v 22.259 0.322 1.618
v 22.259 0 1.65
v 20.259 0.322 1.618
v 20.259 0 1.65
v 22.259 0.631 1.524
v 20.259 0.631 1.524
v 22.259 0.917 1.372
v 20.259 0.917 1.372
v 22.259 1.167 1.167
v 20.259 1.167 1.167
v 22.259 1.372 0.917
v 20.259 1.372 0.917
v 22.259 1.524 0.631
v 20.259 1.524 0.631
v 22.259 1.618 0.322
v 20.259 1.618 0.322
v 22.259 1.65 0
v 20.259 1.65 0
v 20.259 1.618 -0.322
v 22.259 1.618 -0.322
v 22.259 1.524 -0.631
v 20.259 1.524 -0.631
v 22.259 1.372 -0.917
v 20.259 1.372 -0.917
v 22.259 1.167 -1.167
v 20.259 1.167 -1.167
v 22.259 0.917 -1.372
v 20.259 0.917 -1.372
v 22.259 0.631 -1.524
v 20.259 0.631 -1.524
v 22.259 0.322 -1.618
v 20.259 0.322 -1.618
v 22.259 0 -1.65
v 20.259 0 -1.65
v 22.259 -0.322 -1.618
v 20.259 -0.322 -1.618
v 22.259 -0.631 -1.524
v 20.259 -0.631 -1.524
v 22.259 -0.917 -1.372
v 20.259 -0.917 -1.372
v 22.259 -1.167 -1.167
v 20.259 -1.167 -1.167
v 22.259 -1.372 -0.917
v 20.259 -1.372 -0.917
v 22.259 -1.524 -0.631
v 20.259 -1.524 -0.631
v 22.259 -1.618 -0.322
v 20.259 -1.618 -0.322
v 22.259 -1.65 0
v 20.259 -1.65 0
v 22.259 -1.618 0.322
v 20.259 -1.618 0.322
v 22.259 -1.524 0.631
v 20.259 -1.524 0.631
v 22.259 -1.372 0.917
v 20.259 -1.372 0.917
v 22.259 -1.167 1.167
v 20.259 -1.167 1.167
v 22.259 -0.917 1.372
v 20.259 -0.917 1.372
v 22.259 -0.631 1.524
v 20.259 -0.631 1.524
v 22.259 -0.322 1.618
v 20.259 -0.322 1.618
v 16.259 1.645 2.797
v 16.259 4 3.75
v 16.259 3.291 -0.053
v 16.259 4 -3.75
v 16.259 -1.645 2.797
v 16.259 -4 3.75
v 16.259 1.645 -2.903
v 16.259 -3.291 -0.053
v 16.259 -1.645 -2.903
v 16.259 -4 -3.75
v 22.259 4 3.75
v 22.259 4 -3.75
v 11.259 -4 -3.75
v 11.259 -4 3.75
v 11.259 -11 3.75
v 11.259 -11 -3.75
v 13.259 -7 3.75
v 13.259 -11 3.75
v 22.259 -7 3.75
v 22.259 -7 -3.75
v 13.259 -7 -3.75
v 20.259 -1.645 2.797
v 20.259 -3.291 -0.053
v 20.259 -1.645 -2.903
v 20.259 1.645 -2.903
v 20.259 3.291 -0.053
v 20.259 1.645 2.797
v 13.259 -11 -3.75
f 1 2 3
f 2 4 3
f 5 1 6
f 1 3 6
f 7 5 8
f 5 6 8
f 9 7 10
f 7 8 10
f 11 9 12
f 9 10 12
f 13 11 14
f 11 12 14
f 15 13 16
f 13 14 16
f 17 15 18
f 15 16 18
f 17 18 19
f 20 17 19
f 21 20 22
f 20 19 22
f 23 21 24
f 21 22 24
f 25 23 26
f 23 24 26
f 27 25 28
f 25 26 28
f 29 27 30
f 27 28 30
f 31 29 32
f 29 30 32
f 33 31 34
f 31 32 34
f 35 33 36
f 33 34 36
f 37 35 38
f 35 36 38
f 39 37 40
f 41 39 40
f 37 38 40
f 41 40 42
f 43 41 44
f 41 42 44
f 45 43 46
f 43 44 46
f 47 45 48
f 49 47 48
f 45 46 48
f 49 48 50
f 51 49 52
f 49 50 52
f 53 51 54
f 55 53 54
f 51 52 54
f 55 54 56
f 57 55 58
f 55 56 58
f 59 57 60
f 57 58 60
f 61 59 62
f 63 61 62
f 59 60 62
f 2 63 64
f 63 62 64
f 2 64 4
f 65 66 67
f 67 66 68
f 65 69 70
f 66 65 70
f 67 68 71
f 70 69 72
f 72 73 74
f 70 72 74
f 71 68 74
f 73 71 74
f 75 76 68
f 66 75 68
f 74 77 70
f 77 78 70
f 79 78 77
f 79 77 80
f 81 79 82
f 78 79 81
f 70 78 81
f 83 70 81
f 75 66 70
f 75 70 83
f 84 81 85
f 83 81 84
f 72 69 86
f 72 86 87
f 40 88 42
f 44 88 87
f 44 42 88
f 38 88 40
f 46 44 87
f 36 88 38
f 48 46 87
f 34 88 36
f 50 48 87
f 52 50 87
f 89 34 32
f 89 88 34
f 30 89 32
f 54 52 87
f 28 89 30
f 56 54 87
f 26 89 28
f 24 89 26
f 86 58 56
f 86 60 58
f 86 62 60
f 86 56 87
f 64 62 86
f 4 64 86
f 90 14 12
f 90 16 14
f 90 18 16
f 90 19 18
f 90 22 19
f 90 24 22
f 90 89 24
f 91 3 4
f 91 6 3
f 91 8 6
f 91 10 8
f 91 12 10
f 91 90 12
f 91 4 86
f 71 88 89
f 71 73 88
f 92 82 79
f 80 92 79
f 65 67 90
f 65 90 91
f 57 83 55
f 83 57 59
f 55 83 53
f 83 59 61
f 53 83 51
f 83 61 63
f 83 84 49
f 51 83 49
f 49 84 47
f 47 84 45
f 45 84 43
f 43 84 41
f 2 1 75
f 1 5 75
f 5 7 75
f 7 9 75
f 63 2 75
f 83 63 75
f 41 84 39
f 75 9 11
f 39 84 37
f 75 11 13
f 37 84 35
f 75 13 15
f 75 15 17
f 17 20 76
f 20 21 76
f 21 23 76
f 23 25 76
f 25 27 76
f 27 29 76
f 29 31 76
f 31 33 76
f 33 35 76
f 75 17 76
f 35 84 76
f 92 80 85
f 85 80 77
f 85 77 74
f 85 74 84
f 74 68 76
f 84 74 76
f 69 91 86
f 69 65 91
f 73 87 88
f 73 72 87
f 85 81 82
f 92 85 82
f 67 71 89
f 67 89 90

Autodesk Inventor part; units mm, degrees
ref_plane "YZ Plane" through (0, 0, 0) normal (1, 0, 0) x (0, 1, 0)
ref_plane "XZ Plane" through (0, 0, 0) normal (0, 1, 0) x (-1, 0, 0)
ref_plane "XY Plane" through (0, 0, 0) normal (0, 0, 1) x (1, 0, 0)
sketch "Sketch1" plane through (0, 0, 0) normal (0, 0, 1) x (1, 0, 0)
  line L0 (31.7273, 1.5) -> (12.134, 1.5)
  line L1 (31.7273, -1.5) -> (12.134, -1.5)
  line L2 (16.2594, -4) -> (22.2594, -4)
  line L3 (22.2594, -4) -> (22.2594, 4)
  line L4 (22.2594, 4) -> (16.2594, 4)
  line L5 (16.2594, 4) -> (16.2594, -4)
  line L6 (16.2594, -4) -> (22.2594, 4) construction
  line L7 (22.2594, -4) -> (16.2594, 4) construction
  point P0 (0, 0)
  point P1 (19.2594, 0)
  dimension "d0" = 8
  dimension "d1" = 6
extrude "Extrusion1" add sketch "Sketch1" along normal mid plane 7.5
sketch "Sketch2" plane through (16.2594, -4, 3.75) normal (-1, 0, 0) x (0, 0, 1)
  line L0 (0, 0) -> (-7.5, 0) projected
  line L1 (0, 8) -> (0, 0) projected
  line L2 (-7.5, 8) -> (0, 8) projected
  line L3 (-7.5, 0) -> (-7.5, 8) projected
  circle A0 centre (-3.75, 4) radius 1.65
  dimension "d17" = 3.3
extrude "Extrusion2" cut sketch "Sketch2" against normal through all contours A0
sketch "Sketch3" plane through (16.2594, -4, 3.75) normal (-1, 0, 0) x (0, 0, 1)
  point P0 (-3.75, 4)
sketch "Sketch4" plane through (16.2594, -4, 3.75) normal (-1, 0, 0) x (0, 0, 1)
  line L0 (-0.953, 2.3546) -> (-3.803, 0.7091)
  line L1 (-3.803, 0.7091) -> (-6.653, 2.3546)
  line L2 (-6.653, 2.3546) -> (-6.653, 5.6454)
  line L3 (-6.653, 5.6454) -> (-3.803, 7.2909)
  line L4 (-3.803, 7.2909) -> (-0.953, 5.6454)
  line L5 (-0.953, 5.6454) -> (-0.953, 2.3546)
  line L6 (-7.5, 0) -> (-7.5, 8) projected
  point P0 (-3.803, 4)
  dimension "d18" = 5.7
extrude "Extrusion3" cut sketch "Sketch4" against normal blind 4
sketch "Sketch5" plane through (0, 0, 3.75) normal (0, 0, 1) x (1, 0, 0)
  line L0 (16.2594, -4) -> (22.2594, -4) projected
  line L1 (22.2594, -4) -> (22.2594, 4) projected
  line L2 (22.2594, 4) -> (16.2594, 4) projected
  line L3 (16.2594, 4) -> (16.2594, -4) projected
  line L4 (16.2594, -4) -> (22.2594, -4) projected
  line L5 (22.2594, -4) -> (11.2594, -4)
  line L6 (11.2594, -4) -> (11.2594, -7)
  line L7 (11.2594, -7) -> (22.2594, -7)
  line L8 (22.2594, -7) -> (22.2594, -4)
  line L9 (11.2594, -7) -> (13.2594, -7)
  line L10 (13.2594, -7) -> (13.2594, -11)
  line L11 (13.2594, -11) -> (11.2594, -11)
  line L12 (11.2594, -11) -> (11.2594, -7)
  point P0 (0, 0)
  dimension "d13" = 11
  dimension "d14" = 3
  dimension "d15" = 2
  dimension "d16" = 4
extrude "Extrusion4" add sketch "Sketch5" against normal up to surface (7.5 mm away) contours L0 L8 L7 L6 L5 | L7 L10 L11 L12
properties part number "TMP_Holder_MTP"
